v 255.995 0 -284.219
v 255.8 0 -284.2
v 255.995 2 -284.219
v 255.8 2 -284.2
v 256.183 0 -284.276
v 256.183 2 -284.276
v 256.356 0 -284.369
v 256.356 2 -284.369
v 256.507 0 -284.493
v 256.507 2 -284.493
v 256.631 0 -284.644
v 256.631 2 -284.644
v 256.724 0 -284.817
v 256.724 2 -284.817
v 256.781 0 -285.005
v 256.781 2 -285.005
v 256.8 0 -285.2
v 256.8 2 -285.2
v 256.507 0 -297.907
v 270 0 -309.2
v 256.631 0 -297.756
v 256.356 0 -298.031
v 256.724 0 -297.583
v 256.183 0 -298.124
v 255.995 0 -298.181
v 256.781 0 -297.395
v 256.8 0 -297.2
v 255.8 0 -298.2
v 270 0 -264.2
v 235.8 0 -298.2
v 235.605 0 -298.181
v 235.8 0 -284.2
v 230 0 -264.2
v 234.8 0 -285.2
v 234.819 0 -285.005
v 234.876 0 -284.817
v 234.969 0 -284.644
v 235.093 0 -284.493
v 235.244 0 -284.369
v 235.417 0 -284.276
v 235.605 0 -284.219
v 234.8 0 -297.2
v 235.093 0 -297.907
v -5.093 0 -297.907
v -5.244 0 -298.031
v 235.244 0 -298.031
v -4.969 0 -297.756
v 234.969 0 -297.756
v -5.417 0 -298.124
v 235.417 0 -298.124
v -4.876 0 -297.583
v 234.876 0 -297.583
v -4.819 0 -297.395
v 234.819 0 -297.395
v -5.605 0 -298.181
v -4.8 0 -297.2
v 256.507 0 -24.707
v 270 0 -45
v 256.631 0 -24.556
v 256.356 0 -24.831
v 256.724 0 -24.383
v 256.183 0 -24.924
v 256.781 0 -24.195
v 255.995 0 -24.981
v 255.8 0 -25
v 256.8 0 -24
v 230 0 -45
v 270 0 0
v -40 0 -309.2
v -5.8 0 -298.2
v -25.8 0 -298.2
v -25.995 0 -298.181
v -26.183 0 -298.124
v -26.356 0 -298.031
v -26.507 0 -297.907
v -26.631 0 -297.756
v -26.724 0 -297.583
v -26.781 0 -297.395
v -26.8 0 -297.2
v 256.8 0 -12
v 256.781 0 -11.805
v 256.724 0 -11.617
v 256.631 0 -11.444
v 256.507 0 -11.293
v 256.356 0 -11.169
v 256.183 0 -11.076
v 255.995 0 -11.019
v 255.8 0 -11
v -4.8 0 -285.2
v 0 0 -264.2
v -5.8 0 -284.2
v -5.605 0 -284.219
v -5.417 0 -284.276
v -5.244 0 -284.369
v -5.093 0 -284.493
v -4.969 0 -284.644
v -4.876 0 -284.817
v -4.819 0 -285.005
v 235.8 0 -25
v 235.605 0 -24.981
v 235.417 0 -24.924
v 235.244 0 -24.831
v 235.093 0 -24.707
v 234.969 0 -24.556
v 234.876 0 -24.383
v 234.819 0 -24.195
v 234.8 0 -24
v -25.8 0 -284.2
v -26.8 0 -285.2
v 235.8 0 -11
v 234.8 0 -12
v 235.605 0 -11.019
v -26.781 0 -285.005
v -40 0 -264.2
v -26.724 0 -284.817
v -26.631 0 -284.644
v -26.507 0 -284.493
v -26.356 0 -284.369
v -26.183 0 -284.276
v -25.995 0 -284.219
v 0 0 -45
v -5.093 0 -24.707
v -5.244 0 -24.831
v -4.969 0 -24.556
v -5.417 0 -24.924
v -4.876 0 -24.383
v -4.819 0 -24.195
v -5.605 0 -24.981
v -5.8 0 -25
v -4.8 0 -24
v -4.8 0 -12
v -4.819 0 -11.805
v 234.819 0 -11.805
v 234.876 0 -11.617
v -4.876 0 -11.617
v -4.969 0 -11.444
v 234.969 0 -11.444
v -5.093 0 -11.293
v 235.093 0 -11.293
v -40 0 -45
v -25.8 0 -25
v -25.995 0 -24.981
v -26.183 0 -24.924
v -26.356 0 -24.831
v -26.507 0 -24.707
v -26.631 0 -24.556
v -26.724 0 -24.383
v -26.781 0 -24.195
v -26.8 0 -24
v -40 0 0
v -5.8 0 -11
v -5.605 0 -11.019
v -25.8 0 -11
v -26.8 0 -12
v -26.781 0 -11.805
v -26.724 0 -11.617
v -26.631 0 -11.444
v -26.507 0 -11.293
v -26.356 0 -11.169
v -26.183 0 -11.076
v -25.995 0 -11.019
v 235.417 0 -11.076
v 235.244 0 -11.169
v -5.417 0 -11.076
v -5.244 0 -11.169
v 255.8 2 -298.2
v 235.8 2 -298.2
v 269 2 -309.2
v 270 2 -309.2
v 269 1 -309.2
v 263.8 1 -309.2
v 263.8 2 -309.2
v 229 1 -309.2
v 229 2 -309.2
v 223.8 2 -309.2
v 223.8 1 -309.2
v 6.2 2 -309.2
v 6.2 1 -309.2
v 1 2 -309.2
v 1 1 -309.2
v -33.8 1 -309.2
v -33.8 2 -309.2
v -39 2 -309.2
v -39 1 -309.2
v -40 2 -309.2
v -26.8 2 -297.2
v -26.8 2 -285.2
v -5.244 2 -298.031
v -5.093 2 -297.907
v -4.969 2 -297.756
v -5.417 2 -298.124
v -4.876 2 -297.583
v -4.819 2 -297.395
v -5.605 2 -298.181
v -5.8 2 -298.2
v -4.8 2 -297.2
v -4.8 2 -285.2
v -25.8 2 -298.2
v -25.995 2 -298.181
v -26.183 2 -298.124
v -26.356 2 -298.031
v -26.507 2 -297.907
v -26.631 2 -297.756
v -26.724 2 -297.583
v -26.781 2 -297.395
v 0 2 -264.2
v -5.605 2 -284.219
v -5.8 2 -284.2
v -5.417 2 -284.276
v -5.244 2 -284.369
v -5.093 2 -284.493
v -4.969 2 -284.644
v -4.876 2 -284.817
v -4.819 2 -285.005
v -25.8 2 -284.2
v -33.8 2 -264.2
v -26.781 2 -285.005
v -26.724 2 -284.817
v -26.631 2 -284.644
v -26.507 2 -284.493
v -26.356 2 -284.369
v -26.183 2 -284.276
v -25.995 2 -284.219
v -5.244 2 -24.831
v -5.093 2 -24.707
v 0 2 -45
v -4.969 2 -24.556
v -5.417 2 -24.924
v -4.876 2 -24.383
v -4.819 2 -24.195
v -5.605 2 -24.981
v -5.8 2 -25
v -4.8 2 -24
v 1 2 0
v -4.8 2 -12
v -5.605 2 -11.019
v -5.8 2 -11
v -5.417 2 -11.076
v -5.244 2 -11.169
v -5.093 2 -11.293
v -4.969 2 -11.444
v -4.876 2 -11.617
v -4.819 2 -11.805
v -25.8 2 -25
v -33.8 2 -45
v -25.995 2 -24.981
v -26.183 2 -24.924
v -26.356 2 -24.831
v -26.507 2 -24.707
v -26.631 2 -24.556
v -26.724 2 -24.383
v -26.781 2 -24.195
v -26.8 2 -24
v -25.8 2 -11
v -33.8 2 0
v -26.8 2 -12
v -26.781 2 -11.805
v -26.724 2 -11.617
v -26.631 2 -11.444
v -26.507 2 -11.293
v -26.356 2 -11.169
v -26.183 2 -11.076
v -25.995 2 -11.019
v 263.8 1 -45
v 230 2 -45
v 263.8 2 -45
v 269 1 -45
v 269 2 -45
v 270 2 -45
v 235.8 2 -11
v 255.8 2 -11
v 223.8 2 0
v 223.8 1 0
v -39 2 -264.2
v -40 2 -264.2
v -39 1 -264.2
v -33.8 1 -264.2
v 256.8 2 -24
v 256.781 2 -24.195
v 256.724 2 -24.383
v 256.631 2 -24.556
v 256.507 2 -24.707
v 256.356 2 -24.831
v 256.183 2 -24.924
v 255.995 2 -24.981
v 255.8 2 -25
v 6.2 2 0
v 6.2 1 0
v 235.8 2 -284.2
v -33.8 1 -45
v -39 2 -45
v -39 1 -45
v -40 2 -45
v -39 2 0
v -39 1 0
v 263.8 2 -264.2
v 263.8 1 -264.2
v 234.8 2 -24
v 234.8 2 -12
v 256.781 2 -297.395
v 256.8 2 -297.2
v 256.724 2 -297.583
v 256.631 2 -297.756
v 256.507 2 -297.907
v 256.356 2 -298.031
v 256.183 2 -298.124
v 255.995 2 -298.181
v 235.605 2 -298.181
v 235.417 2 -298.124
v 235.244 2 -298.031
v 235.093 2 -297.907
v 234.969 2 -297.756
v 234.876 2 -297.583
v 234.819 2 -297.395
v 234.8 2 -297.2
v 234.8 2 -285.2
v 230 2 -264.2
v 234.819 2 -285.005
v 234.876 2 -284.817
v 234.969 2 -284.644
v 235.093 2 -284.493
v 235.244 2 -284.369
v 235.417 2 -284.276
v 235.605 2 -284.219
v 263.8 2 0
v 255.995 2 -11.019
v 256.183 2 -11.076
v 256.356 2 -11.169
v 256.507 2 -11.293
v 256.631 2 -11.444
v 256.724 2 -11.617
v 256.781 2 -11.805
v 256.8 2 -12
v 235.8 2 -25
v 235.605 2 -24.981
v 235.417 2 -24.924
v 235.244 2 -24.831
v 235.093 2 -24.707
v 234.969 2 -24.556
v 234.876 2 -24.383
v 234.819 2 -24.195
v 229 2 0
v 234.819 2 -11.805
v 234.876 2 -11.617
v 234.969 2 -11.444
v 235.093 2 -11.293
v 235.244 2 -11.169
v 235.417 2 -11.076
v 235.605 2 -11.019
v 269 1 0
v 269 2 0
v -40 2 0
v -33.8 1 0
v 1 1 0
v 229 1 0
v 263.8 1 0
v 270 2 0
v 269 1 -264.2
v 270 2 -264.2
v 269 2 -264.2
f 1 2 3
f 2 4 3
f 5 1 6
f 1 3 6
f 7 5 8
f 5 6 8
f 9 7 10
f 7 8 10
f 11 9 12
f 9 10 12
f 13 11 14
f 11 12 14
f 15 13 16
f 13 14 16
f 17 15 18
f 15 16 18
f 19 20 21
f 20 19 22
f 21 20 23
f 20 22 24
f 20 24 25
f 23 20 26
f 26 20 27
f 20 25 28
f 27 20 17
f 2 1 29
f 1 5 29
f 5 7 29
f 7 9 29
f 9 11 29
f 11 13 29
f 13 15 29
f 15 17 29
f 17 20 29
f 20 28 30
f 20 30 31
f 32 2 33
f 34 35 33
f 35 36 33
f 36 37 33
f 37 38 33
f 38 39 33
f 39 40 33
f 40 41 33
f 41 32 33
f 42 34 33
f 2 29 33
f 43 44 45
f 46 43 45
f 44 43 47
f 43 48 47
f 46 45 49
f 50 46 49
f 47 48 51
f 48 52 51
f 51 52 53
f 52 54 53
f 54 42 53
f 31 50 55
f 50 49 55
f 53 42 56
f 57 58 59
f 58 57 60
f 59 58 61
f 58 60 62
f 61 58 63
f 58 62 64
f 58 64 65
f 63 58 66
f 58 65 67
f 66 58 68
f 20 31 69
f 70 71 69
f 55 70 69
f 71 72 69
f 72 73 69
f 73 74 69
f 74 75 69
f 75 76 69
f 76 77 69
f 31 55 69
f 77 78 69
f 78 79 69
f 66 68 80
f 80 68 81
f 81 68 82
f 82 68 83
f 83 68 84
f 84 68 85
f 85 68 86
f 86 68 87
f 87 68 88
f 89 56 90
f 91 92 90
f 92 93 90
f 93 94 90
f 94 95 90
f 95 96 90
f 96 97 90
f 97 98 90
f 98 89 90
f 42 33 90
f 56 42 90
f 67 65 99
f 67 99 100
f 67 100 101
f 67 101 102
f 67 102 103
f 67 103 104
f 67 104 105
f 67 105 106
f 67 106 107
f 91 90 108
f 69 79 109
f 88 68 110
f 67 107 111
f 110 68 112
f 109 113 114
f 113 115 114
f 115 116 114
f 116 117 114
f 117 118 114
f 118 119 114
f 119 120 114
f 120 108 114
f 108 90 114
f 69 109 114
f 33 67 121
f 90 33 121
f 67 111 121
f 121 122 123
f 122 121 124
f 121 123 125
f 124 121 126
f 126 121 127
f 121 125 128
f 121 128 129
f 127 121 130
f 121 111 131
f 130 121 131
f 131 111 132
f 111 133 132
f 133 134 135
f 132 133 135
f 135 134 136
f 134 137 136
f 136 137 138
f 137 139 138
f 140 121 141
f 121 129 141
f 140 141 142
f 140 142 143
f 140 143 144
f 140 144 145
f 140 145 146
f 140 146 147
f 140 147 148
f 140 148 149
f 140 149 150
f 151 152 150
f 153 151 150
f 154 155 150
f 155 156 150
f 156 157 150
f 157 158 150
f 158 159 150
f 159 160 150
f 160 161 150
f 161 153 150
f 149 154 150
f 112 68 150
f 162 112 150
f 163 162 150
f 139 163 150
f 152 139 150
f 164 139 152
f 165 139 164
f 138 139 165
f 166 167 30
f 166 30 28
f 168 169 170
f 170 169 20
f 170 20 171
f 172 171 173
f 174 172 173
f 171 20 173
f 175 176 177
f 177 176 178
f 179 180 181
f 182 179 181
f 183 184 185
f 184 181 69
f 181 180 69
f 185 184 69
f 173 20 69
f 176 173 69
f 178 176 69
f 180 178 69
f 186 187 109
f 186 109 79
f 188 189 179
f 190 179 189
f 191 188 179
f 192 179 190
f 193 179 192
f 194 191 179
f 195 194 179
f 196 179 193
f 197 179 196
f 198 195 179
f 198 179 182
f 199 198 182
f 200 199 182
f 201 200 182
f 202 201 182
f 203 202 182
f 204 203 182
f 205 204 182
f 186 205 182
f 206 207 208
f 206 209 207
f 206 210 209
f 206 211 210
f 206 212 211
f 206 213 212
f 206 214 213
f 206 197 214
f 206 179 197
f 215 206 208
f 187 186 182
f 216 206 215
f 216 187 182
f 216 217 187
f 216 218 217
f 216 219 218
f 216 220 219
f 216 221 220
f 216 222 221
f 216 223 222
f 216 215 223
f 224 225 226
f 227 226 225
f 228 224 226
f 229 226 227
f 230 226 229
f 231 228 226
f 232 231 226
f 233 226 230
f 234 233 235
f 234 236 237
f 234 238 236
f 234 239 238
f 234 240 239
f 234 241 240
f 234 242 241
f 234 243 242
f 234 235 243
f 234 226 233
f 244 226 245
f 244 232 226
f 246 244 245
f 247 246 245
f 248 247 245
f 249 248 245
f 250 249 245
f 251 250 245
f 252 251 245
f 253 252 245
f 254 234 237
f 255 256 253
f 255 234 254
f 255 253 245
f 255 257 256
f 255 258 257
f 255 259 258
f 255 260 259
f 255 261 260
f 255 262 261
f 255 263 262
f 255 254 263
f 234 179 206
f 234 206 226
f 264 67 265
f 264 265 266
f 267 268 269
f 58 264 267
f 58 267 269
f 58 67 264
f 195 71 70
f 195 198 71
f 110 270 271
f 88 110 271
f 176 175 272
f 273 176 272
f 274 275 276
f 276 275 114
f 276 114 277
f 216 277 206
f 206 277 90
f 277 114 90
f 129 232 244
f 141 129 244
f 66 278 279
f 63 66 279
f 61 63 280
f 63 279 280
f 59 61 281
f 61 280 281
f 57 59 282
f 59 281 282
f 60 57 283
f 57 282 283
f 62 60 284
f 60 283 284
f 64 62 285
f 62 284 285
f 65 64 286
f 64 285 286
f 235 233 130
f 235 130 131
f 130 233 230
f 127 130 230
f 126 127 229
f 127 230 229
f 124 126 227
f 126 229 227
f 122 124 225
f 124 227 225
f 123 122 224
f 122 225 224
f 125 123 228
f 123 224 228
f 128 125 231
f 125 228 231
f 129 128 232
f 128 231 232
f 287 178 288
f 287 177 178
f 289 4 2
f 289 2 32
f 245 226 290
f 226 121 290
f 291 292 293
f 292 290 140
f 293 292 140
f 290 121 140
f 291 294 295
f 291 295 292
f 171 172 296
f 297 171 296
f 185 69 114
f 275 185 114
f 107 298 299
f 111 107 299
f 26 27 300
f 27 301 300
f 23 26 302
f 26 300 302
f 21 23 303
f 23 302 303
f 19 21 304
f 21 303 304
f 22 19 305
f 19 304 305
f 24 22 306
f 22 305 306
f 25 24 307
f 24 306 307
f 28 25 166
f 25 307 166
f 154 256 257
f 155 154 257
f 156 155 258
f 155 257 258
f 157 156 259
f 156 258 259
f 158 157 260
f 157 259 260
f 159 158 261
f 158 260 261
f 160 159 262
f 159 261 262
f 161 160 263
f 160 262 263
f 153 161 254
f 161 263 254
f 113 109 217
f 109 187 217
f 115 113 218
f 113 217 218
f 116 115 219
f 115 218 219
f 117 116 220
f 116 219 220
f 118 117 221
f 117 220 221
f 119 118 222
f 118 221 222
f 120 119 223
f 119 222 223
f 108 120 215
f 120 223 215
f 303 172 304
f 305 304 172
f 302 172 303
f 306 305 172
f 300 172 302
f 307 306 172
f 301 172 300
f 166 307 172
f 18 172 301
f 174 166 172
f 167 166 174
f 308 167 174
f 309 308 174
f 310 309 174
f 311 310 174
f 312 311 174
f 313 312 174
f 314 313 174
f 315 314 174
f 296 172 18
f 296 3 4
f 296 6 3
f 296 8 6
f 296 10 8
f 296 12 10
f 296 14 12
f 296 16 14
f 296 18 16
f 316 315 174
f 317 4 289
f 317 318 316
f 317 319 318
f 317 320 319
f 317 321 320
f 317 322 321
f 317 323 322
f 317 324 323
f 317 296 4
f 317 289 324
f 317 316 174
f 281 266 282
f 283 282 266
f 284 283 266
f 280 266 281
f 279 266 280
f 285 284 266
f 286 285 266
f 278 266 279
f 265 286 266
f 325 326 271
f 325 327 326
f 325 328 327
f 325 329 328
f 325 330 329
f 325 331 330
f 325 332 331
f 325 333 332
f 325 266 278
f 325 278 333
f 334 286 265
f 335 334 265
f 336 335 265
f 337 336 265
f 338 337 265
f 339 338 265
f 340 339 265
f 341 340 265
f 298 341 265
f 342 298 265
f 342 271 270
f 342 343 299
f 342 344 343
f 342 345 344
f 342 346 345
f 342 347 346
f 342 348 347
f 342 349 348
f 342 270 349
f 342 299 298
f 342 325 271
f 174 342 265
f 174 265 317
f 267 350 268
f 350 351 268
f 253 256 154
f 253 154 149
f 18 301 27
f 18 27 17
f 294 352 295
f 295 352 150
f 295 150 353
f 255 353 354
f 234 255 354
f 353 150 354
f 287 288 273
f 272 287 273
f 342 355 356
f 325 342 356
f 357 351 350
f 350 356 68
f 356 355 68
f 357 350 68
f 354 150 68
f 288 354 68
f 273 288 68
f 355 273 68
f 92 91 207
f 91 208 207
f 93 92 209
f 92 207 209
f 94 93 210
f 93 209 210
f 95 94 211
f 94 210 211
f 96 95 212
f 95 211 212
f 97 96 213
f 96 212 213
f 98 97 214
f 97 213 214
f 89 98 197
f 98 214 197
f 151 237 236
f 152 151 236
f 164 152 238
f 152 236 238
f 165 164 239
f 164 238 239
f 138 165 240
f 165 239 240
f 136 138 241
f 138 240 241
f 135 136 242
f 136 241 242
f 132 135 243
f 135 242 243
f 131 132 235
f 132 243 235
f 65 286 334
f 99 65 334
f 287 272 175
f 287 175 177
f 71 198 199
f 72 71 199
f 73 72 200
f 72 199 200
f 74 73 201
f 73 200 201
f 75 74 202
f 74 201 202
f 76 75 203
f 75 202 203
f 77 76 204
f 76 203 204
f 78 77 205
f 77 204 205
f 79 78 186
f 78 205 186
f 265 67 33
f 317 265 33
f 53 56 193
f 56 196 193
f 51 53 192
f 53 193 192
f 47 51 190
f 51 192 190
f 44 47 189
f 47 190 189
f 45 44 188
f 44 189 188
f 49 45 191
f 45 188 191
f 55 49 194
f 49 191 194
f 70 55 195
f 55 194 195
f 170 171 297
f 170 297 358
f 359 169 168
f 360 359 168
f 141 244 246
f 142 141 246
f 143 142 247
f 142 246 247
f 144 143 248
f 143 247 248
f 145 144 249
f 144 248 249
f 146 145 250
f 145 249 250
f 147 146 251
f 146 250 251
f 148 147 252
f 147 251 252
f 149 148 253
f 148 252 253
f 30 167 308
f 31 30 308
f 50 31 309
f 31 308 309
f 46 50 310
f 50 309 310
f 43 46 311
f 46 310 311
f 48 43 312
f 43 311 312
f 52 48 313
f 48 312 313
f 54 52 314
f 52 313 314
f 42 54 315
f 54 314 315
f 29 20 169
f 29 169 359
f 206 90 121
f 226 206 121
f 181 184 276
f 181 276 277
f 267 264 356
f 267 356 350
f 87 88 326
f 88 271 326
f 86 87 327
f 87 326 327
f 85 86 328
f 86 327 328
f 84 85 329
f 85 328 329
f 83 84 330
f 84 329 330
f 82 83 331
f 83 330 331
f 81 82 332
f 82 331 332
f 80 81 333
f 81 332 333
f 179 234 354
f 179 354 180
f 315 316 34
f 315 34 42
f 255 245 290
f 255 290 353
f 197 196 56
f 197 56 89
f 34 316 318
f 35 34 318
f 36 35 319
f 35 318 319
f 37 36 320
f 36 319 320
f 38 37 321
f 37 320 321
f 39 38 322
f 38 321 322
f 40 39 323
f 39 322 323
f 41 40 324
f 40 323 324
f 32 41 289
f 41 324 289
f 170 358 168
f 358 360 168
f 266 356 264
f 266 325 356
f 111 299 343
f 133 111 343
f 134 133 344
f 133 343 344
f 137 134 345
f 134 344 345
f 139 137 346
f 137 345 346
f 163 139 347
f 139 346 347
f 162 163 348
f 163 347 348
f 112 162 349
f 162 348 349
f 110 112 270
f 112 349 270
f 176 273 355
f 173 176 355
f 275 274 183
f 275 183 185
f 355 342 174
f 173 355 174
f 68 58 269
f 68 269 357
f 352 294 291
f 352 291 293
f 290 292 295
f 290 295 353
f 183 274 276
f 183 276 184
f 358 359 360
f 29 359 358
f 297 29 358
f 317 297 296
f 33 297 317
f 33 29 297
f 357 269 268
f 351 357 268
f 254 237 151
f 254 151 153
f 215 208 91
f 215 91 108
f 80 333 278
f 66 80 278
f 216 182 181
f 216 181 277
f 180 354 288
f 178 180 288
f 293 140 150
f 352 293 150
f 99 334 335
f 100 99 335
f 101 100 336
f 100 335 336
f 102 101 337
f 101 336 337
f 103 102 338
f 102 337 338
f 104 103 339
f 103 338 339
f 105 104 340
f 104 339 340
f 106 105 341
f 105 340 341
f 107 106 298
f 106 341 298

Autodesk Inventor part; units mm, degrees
ref_plane "YZ Plane" through (0, 0, 0) normal (1, 0, 0) x (0, 1, 0)
ref_plane "XZ Plane" through (0, 0, 0) normal (0, 1, 0) x (-1, 0, 0)
ref_plane "XY Plane" through (0, 0, 0) normal (0, 0, 1) x (1, 0, 0)
sketch "스케치1" plane through (0, 0, 0) normal (0, 1, 0) x (-1, 0, 0)
  line L0 (0, 0) -> (-230, 0)
  line L1 (-230, 0) -> (-230, -309.2)
  line L2 (-230, -309.2) -> (0, -309.2)
  line L3 (0, -309.2) -> (0, 0)
  dimension "d0" = 230
  dimension "d1" = 309.2
extrude "돌출1" add sketch "스케치1" along normal blind 2
sketch "스케치2" plane through (0, 2, 0) normal (0, 1, 0) x (1, 0, 0)
  line L0 (1, 0) -> (1, 309.2)
  line L1 (230, 309.2) -> (0, 309.2) projected
  line L2 (6.2, 309.2) -> (6.2, 0)
  line L3 (229, 0) -> (229, 309.2)
  line L4 (223.8, 309.2) -> (223.8, 0)
  line L5 (0, 0) -> (230, 0) projected
  line L6 (0, 309.2) -> (0, 0) projected
  line L7 (230, 0) -> (230, 309.2) projected
  line L8 (1, 0) -> (6.2, 0)
  line L9 (1, 309.2) -> (6.2, 309.2)
  line L10 (223.8, 309.2) -> (229, 309.2)
  line L11 (223.8, 0) -> (229, 0)
  dimension "d4" = 1
  dimension "d5" = 5.2
  dimension "d6" = 1
  dimension "d7" = 5.2
extrude "돌출2" cut sketch "스케치2" against normal blind 1 contours L0 L1 L2 L5 | L4 L1 L3 L5
sketch "스케치3" plane through (0, 0, 0) normal (0, -1, 0) x (1, 0, 0)
  line L0 (0, 0) -> (0, -45)
  line L1 (0, -309.2) -> (0, 0) projected
  line L2 (0, -45) -> (-40, -45)
  line L3 (-40, -45) -> (-40, 0)
  line L4 (-40, 0) -> (0, 0)
  line L5 (230, 0) -> (230, -309.2) projected
  line L6 (230, 0) -> (230, -45)
  line L7 (230, -45) -> (270, -45)
  line L8 (270, -45) -> (270, 0)
  line L9 (270, 0) -> (230, 0)
  line L10 (230, -309.2) -> (270, -309.2)
  line L11 (270, -309.2) -> (270, -264.2)
  line L12 (270, -264.2) -> (230, -264.2)
  line L13 (0, -309.2) -> (-40, -309.2)
  line L14 (-40, -309.2) -> (-40, -264.2)
  line L15 (-40, -264.2) -> (0, -264.2)
  dimension "d10" = 45
extrude "돌출3" add sketch "스케치3" against normal blind 2
sketch "스케치4" plane through (0, 2, 0) normal (0, 1, 0) x (1, 0, 0)
  line L0 (1, 0) -> (1, 309.2) projected
  line L1 (1, 309.2) -> (-40, 309.2) projected
  line L2 (-40, 309.2) -> (-40, 264.2) projected
  line L3 (-40, 264.2) -> (0, 264.2) projected
  line L4 (0, 264.2) -> (0, 45) projected
  line L5 (0, 45) -> (-40, 45) projected
  line L6 (-40, 45) -> (-40, 0) projected
  line L7 (-40, 0) -> (1, 0) projected
  line L8 (223.8, 0) -> (223.8, 309.2) projected
  line L9 (223.8, 309.2) -> (6.2, 309.2) projected
  line L10 (6.2, 309.2) -> (6.2, 0) projected
  line L11 (6.2, 0) -> (223.8, 0) projected
  line L12 (229, 309.2) -> (229, 0) projected
  line L13 (229, 0) -> (270, 0) projected
  line L14 (270, 0) -> (270, 45) projected
  line L15 (270, 45) -> (230, 45) projected
  line L16 (230, 45) -> (230, 264.2) projected
  line L17 (230, 264.2) -> (270, 264.2) projected
  line L18 (270, 264.2) -> (270, 309.2) projected
  line L19 (270, 309.2) -> (229, 309.2) projected
  line L20 (-39, 0) -> (-39, 45)
  line L21 (0, 45) -> (-40, 45) projected
  line L22 (-33.8, 45) -> (-33.8, 0)
  line L23 (-39, 264.2) -> (-39, 309.2)
  line L24 (1, 309.2) -> (-40, 309.2) projected
  line L25 (-33.8, 309.2) -> (-33.8, 264.2)
  line L26 (0, 264.2) -> (-40, 264.2) projected
  line L27 (229, 0) -> (270, 0) projected
  line L28 (269, 0) -> (269, 45)
  line L29 (230, 45) -> (270, 45) projected
  line L30 (263.8, 0) -> (263.8, 45)
  line L31 (230, 264.2) -> (270, 264.2) projected
  line L32 (269, 264.2) -> (269, 309.2)
  line L33 (270, 309.2) -> (229, 309.2) projected
  line L34 (263.8, 309.2) -> (263.8, 264.2)
  line L35 (263.8, 264.2) -> (269, 264.2)
  line L36 (269, 309.2) -> (263.8, 309.2)
  point P0 (0, 0)
  dimension "d13" = 1
  dimension "d14" = 5.2
  dimension "d15" = 1
  dimension "d16" = 1
  dimension "d17" = 5.2
extrude "돌출4" cut sketch "스케치4" against normal blind 1 contours L7 L20 L5 L22 | L25 L3 L23 L1 | L19 L32 L17 L34 | L30 L15 L28 L13
sketch "스케치5" plane through (0, 2, 0) normal (0, 1, 0) x (1, 0, 0)
  line L0 (223.8, 0) -> (223.8, 309.2) projected
  line L1 (223.8, 309.2) -> (6.2, 309.2) projected
  line L2 (6.2, 309.2) -> (6.2, 0) projected
  line L3 (6.2, 0) -> (223.8, 0) projected
  line L4 (-33.8, 309.2) -> (-33.8, 264.2) projected
  line L5 (-33.8, 264.2) -> (0, 264.2) projected
  line L6 (0, 264.2) -> (0, 45) projected
  line L7 (0, 45) -> (-33.8, 45) projected
  line L8 (-33.8, 45) -> (-33.8, 0) projected
  line L9 (-33.8, 0) -> (1, 0) projected
  line L10 (1, 0) -> (1, 309.2) projected
  line L11 (1, 309.2) -> (-33.8, 309.2) projected
  line L12 (263.8, 0) -> (263.8, 45) projected
  line L13 (263.8, 45) -> (230, 45) projected
  line L14 (230, 45) -> (230, 264.2) projected
  line L15 (230, 264.2) -> (263.8, 264.2) projected
  line L16 (263.8, 264.2) -> (263.8, 309.2) projected
  line L17 (263.8, 309.2) -> (229, 309.2) projected
  line L18 (229, 309.2) -> (229, 0) projected
  line L19 (229, 0) -> (263.8, 0) projected
  line L20 (-33.8, 45) -> (-33.8, 0) projected
  line L21 (-40, 45) -> (0, 45) projected
  line L22 (-4.8, 24) -> (-4.8, 12)
  line L23 (-5.8, 11) -> (-25.8, 11)
  line L24 (-26.8, 12) -> (-26.8, 24)
  line L25 (-5.8, 25) -> (-25.8, 25)
  line L26 (230, 45) -> (270, 45) projected
  line L27 (255.8, 25) -> (235.8, 25)
  line L28 (234.8, 24) -> (234.8, 12)
  line L29 (235.8, 11) -> (255.8, 11)
  line L30 (256.8, 12) -> (256.8, 24)
  line L31 (230, 264.2) -> (263.8, 264.2) projected
  line L32 (255.8, 284.2) -> (235.8, 284.2)
  line L33 (234.8, 285.2) -> (234.8, 297.2)
  line L34 (235.8, 298.2) -> (255.8, 298.2)
  line L35 (256.8, 297.2) -> (256.8, 285.2)
  line L36 (-33.8, 264.2) -> (0, 264.2) projected
  arc A0 (235.8, 298.2) -> (234.8, 297.2) centre (235.8, 297.2) ccw
  arc A1 (256.8, 297.2) -> (255.8, 298.2) centre (255.8, 297.2) ccw
  arc A2 (255.8, 284.2) -> (256.8, 285.2) centre (255.8, 285.2) ccw
  arc A3 (234.8, 285.2) -> (235.8, 284.2) centre (235.8, 285.2) ccw
  arc A4 (235.8, 25) -> (234.8, 24) centre (235.8, 24) ccw
  arc A5 (234.8, 12) -> (235.8, 11) centre (235.8, 12) ccw
  arc A6 (255.8, 11) -> (256.8, 12) centre (255.8, 12) ccw
  arc A7 (256.8, 24) -> (255.8, 25) centre (255.8, 24) ccw
  arc A8 (-25.8, 25) -> (-26.8, 24) centre (-25.8, 24) ccw
  arc A9 (-26.8, 12) -> (-25.8, 11) centre (-25.8, 12) ccw
  arc A10 (-5.8, 11) -> (-4.8, 12) centre (-5.8, 12) ccw
  arc A11 (-4.8, 24) -> (-5.8, 25) centre (-5.8, 24) ccw
  line L37 (1, 309.2) -> (-33.8, 309.2) projected
  line L38 (-33.8, 309.2) -> (-26.8, 309.2)
  line L39 (-26.8, 309.2) -> (-26.8, 298.2)
  line L40 (-25.8, 298.2) -> (-5.8, 298.2)
  line L41 (-4.8, 297.2) -> (-4.8, 285.2)
  line L42 (-5.8, 284.2) -> (-25.8, 284.2)
  line L43 (-26.8, 285.2) -> (-26.8, 297.2)
  arc A12 (-5.8, 284.2) -> (-4.8, 285.2) centre (-5.8, 285.2) ccw
  arc A13 (-4.8, 297.2) -> (-5.8, 298.2) centre (-5.8, 297.2) ccw
  arc A14 (-25.8, 298.2) -> (-26.8, 297.2) centre (-25.8, 297.2) ccw
  arc A15 (-26.8, 285.2) -> (-25.8, 284.2) centre (-25.8, 285.2) ccw
  point P0 (0, 0)
  point P1 (-4.8, 11)
  point P2 (234.8, 25)
  point P3 (234.8, 11)
  point P4 (256.8, 11)
  point P5 (234.8, 284.2)
  point P6 (234.8, 298.2)
  point P7 (256.8, 298.2)
  point P8 (-4.8, 284.2)
  point P9 (-4.8, 298.2)
  point P10 (-26.8, 284.2)
  dimension "d27" = 14
  dimension "d29" = 14
  dimension "d33" = 11
  dimension "d34" = 11
  dimension "d35" = 11
  dimension "d37" = 7
  dimension "d38" = 11
  dimension "d39" = 22
  dimension "d40" = 14
  dimension "d41" = 1
  dimension "d42" = 14
extrude "돌출6" cut sketch "스케치5" against normal blind 10 contours L22 A10 L23 A9 L24 A8 L25 A11 | A7 L30 A6 L29 A5 L28 A4 L27 | L32 A3 L33 A0 L34 A1 L35 A2 | L40 A13 L41 A12 L42 A15 L43 A14
properties part number "밑판" material "알루미늄 6061"
